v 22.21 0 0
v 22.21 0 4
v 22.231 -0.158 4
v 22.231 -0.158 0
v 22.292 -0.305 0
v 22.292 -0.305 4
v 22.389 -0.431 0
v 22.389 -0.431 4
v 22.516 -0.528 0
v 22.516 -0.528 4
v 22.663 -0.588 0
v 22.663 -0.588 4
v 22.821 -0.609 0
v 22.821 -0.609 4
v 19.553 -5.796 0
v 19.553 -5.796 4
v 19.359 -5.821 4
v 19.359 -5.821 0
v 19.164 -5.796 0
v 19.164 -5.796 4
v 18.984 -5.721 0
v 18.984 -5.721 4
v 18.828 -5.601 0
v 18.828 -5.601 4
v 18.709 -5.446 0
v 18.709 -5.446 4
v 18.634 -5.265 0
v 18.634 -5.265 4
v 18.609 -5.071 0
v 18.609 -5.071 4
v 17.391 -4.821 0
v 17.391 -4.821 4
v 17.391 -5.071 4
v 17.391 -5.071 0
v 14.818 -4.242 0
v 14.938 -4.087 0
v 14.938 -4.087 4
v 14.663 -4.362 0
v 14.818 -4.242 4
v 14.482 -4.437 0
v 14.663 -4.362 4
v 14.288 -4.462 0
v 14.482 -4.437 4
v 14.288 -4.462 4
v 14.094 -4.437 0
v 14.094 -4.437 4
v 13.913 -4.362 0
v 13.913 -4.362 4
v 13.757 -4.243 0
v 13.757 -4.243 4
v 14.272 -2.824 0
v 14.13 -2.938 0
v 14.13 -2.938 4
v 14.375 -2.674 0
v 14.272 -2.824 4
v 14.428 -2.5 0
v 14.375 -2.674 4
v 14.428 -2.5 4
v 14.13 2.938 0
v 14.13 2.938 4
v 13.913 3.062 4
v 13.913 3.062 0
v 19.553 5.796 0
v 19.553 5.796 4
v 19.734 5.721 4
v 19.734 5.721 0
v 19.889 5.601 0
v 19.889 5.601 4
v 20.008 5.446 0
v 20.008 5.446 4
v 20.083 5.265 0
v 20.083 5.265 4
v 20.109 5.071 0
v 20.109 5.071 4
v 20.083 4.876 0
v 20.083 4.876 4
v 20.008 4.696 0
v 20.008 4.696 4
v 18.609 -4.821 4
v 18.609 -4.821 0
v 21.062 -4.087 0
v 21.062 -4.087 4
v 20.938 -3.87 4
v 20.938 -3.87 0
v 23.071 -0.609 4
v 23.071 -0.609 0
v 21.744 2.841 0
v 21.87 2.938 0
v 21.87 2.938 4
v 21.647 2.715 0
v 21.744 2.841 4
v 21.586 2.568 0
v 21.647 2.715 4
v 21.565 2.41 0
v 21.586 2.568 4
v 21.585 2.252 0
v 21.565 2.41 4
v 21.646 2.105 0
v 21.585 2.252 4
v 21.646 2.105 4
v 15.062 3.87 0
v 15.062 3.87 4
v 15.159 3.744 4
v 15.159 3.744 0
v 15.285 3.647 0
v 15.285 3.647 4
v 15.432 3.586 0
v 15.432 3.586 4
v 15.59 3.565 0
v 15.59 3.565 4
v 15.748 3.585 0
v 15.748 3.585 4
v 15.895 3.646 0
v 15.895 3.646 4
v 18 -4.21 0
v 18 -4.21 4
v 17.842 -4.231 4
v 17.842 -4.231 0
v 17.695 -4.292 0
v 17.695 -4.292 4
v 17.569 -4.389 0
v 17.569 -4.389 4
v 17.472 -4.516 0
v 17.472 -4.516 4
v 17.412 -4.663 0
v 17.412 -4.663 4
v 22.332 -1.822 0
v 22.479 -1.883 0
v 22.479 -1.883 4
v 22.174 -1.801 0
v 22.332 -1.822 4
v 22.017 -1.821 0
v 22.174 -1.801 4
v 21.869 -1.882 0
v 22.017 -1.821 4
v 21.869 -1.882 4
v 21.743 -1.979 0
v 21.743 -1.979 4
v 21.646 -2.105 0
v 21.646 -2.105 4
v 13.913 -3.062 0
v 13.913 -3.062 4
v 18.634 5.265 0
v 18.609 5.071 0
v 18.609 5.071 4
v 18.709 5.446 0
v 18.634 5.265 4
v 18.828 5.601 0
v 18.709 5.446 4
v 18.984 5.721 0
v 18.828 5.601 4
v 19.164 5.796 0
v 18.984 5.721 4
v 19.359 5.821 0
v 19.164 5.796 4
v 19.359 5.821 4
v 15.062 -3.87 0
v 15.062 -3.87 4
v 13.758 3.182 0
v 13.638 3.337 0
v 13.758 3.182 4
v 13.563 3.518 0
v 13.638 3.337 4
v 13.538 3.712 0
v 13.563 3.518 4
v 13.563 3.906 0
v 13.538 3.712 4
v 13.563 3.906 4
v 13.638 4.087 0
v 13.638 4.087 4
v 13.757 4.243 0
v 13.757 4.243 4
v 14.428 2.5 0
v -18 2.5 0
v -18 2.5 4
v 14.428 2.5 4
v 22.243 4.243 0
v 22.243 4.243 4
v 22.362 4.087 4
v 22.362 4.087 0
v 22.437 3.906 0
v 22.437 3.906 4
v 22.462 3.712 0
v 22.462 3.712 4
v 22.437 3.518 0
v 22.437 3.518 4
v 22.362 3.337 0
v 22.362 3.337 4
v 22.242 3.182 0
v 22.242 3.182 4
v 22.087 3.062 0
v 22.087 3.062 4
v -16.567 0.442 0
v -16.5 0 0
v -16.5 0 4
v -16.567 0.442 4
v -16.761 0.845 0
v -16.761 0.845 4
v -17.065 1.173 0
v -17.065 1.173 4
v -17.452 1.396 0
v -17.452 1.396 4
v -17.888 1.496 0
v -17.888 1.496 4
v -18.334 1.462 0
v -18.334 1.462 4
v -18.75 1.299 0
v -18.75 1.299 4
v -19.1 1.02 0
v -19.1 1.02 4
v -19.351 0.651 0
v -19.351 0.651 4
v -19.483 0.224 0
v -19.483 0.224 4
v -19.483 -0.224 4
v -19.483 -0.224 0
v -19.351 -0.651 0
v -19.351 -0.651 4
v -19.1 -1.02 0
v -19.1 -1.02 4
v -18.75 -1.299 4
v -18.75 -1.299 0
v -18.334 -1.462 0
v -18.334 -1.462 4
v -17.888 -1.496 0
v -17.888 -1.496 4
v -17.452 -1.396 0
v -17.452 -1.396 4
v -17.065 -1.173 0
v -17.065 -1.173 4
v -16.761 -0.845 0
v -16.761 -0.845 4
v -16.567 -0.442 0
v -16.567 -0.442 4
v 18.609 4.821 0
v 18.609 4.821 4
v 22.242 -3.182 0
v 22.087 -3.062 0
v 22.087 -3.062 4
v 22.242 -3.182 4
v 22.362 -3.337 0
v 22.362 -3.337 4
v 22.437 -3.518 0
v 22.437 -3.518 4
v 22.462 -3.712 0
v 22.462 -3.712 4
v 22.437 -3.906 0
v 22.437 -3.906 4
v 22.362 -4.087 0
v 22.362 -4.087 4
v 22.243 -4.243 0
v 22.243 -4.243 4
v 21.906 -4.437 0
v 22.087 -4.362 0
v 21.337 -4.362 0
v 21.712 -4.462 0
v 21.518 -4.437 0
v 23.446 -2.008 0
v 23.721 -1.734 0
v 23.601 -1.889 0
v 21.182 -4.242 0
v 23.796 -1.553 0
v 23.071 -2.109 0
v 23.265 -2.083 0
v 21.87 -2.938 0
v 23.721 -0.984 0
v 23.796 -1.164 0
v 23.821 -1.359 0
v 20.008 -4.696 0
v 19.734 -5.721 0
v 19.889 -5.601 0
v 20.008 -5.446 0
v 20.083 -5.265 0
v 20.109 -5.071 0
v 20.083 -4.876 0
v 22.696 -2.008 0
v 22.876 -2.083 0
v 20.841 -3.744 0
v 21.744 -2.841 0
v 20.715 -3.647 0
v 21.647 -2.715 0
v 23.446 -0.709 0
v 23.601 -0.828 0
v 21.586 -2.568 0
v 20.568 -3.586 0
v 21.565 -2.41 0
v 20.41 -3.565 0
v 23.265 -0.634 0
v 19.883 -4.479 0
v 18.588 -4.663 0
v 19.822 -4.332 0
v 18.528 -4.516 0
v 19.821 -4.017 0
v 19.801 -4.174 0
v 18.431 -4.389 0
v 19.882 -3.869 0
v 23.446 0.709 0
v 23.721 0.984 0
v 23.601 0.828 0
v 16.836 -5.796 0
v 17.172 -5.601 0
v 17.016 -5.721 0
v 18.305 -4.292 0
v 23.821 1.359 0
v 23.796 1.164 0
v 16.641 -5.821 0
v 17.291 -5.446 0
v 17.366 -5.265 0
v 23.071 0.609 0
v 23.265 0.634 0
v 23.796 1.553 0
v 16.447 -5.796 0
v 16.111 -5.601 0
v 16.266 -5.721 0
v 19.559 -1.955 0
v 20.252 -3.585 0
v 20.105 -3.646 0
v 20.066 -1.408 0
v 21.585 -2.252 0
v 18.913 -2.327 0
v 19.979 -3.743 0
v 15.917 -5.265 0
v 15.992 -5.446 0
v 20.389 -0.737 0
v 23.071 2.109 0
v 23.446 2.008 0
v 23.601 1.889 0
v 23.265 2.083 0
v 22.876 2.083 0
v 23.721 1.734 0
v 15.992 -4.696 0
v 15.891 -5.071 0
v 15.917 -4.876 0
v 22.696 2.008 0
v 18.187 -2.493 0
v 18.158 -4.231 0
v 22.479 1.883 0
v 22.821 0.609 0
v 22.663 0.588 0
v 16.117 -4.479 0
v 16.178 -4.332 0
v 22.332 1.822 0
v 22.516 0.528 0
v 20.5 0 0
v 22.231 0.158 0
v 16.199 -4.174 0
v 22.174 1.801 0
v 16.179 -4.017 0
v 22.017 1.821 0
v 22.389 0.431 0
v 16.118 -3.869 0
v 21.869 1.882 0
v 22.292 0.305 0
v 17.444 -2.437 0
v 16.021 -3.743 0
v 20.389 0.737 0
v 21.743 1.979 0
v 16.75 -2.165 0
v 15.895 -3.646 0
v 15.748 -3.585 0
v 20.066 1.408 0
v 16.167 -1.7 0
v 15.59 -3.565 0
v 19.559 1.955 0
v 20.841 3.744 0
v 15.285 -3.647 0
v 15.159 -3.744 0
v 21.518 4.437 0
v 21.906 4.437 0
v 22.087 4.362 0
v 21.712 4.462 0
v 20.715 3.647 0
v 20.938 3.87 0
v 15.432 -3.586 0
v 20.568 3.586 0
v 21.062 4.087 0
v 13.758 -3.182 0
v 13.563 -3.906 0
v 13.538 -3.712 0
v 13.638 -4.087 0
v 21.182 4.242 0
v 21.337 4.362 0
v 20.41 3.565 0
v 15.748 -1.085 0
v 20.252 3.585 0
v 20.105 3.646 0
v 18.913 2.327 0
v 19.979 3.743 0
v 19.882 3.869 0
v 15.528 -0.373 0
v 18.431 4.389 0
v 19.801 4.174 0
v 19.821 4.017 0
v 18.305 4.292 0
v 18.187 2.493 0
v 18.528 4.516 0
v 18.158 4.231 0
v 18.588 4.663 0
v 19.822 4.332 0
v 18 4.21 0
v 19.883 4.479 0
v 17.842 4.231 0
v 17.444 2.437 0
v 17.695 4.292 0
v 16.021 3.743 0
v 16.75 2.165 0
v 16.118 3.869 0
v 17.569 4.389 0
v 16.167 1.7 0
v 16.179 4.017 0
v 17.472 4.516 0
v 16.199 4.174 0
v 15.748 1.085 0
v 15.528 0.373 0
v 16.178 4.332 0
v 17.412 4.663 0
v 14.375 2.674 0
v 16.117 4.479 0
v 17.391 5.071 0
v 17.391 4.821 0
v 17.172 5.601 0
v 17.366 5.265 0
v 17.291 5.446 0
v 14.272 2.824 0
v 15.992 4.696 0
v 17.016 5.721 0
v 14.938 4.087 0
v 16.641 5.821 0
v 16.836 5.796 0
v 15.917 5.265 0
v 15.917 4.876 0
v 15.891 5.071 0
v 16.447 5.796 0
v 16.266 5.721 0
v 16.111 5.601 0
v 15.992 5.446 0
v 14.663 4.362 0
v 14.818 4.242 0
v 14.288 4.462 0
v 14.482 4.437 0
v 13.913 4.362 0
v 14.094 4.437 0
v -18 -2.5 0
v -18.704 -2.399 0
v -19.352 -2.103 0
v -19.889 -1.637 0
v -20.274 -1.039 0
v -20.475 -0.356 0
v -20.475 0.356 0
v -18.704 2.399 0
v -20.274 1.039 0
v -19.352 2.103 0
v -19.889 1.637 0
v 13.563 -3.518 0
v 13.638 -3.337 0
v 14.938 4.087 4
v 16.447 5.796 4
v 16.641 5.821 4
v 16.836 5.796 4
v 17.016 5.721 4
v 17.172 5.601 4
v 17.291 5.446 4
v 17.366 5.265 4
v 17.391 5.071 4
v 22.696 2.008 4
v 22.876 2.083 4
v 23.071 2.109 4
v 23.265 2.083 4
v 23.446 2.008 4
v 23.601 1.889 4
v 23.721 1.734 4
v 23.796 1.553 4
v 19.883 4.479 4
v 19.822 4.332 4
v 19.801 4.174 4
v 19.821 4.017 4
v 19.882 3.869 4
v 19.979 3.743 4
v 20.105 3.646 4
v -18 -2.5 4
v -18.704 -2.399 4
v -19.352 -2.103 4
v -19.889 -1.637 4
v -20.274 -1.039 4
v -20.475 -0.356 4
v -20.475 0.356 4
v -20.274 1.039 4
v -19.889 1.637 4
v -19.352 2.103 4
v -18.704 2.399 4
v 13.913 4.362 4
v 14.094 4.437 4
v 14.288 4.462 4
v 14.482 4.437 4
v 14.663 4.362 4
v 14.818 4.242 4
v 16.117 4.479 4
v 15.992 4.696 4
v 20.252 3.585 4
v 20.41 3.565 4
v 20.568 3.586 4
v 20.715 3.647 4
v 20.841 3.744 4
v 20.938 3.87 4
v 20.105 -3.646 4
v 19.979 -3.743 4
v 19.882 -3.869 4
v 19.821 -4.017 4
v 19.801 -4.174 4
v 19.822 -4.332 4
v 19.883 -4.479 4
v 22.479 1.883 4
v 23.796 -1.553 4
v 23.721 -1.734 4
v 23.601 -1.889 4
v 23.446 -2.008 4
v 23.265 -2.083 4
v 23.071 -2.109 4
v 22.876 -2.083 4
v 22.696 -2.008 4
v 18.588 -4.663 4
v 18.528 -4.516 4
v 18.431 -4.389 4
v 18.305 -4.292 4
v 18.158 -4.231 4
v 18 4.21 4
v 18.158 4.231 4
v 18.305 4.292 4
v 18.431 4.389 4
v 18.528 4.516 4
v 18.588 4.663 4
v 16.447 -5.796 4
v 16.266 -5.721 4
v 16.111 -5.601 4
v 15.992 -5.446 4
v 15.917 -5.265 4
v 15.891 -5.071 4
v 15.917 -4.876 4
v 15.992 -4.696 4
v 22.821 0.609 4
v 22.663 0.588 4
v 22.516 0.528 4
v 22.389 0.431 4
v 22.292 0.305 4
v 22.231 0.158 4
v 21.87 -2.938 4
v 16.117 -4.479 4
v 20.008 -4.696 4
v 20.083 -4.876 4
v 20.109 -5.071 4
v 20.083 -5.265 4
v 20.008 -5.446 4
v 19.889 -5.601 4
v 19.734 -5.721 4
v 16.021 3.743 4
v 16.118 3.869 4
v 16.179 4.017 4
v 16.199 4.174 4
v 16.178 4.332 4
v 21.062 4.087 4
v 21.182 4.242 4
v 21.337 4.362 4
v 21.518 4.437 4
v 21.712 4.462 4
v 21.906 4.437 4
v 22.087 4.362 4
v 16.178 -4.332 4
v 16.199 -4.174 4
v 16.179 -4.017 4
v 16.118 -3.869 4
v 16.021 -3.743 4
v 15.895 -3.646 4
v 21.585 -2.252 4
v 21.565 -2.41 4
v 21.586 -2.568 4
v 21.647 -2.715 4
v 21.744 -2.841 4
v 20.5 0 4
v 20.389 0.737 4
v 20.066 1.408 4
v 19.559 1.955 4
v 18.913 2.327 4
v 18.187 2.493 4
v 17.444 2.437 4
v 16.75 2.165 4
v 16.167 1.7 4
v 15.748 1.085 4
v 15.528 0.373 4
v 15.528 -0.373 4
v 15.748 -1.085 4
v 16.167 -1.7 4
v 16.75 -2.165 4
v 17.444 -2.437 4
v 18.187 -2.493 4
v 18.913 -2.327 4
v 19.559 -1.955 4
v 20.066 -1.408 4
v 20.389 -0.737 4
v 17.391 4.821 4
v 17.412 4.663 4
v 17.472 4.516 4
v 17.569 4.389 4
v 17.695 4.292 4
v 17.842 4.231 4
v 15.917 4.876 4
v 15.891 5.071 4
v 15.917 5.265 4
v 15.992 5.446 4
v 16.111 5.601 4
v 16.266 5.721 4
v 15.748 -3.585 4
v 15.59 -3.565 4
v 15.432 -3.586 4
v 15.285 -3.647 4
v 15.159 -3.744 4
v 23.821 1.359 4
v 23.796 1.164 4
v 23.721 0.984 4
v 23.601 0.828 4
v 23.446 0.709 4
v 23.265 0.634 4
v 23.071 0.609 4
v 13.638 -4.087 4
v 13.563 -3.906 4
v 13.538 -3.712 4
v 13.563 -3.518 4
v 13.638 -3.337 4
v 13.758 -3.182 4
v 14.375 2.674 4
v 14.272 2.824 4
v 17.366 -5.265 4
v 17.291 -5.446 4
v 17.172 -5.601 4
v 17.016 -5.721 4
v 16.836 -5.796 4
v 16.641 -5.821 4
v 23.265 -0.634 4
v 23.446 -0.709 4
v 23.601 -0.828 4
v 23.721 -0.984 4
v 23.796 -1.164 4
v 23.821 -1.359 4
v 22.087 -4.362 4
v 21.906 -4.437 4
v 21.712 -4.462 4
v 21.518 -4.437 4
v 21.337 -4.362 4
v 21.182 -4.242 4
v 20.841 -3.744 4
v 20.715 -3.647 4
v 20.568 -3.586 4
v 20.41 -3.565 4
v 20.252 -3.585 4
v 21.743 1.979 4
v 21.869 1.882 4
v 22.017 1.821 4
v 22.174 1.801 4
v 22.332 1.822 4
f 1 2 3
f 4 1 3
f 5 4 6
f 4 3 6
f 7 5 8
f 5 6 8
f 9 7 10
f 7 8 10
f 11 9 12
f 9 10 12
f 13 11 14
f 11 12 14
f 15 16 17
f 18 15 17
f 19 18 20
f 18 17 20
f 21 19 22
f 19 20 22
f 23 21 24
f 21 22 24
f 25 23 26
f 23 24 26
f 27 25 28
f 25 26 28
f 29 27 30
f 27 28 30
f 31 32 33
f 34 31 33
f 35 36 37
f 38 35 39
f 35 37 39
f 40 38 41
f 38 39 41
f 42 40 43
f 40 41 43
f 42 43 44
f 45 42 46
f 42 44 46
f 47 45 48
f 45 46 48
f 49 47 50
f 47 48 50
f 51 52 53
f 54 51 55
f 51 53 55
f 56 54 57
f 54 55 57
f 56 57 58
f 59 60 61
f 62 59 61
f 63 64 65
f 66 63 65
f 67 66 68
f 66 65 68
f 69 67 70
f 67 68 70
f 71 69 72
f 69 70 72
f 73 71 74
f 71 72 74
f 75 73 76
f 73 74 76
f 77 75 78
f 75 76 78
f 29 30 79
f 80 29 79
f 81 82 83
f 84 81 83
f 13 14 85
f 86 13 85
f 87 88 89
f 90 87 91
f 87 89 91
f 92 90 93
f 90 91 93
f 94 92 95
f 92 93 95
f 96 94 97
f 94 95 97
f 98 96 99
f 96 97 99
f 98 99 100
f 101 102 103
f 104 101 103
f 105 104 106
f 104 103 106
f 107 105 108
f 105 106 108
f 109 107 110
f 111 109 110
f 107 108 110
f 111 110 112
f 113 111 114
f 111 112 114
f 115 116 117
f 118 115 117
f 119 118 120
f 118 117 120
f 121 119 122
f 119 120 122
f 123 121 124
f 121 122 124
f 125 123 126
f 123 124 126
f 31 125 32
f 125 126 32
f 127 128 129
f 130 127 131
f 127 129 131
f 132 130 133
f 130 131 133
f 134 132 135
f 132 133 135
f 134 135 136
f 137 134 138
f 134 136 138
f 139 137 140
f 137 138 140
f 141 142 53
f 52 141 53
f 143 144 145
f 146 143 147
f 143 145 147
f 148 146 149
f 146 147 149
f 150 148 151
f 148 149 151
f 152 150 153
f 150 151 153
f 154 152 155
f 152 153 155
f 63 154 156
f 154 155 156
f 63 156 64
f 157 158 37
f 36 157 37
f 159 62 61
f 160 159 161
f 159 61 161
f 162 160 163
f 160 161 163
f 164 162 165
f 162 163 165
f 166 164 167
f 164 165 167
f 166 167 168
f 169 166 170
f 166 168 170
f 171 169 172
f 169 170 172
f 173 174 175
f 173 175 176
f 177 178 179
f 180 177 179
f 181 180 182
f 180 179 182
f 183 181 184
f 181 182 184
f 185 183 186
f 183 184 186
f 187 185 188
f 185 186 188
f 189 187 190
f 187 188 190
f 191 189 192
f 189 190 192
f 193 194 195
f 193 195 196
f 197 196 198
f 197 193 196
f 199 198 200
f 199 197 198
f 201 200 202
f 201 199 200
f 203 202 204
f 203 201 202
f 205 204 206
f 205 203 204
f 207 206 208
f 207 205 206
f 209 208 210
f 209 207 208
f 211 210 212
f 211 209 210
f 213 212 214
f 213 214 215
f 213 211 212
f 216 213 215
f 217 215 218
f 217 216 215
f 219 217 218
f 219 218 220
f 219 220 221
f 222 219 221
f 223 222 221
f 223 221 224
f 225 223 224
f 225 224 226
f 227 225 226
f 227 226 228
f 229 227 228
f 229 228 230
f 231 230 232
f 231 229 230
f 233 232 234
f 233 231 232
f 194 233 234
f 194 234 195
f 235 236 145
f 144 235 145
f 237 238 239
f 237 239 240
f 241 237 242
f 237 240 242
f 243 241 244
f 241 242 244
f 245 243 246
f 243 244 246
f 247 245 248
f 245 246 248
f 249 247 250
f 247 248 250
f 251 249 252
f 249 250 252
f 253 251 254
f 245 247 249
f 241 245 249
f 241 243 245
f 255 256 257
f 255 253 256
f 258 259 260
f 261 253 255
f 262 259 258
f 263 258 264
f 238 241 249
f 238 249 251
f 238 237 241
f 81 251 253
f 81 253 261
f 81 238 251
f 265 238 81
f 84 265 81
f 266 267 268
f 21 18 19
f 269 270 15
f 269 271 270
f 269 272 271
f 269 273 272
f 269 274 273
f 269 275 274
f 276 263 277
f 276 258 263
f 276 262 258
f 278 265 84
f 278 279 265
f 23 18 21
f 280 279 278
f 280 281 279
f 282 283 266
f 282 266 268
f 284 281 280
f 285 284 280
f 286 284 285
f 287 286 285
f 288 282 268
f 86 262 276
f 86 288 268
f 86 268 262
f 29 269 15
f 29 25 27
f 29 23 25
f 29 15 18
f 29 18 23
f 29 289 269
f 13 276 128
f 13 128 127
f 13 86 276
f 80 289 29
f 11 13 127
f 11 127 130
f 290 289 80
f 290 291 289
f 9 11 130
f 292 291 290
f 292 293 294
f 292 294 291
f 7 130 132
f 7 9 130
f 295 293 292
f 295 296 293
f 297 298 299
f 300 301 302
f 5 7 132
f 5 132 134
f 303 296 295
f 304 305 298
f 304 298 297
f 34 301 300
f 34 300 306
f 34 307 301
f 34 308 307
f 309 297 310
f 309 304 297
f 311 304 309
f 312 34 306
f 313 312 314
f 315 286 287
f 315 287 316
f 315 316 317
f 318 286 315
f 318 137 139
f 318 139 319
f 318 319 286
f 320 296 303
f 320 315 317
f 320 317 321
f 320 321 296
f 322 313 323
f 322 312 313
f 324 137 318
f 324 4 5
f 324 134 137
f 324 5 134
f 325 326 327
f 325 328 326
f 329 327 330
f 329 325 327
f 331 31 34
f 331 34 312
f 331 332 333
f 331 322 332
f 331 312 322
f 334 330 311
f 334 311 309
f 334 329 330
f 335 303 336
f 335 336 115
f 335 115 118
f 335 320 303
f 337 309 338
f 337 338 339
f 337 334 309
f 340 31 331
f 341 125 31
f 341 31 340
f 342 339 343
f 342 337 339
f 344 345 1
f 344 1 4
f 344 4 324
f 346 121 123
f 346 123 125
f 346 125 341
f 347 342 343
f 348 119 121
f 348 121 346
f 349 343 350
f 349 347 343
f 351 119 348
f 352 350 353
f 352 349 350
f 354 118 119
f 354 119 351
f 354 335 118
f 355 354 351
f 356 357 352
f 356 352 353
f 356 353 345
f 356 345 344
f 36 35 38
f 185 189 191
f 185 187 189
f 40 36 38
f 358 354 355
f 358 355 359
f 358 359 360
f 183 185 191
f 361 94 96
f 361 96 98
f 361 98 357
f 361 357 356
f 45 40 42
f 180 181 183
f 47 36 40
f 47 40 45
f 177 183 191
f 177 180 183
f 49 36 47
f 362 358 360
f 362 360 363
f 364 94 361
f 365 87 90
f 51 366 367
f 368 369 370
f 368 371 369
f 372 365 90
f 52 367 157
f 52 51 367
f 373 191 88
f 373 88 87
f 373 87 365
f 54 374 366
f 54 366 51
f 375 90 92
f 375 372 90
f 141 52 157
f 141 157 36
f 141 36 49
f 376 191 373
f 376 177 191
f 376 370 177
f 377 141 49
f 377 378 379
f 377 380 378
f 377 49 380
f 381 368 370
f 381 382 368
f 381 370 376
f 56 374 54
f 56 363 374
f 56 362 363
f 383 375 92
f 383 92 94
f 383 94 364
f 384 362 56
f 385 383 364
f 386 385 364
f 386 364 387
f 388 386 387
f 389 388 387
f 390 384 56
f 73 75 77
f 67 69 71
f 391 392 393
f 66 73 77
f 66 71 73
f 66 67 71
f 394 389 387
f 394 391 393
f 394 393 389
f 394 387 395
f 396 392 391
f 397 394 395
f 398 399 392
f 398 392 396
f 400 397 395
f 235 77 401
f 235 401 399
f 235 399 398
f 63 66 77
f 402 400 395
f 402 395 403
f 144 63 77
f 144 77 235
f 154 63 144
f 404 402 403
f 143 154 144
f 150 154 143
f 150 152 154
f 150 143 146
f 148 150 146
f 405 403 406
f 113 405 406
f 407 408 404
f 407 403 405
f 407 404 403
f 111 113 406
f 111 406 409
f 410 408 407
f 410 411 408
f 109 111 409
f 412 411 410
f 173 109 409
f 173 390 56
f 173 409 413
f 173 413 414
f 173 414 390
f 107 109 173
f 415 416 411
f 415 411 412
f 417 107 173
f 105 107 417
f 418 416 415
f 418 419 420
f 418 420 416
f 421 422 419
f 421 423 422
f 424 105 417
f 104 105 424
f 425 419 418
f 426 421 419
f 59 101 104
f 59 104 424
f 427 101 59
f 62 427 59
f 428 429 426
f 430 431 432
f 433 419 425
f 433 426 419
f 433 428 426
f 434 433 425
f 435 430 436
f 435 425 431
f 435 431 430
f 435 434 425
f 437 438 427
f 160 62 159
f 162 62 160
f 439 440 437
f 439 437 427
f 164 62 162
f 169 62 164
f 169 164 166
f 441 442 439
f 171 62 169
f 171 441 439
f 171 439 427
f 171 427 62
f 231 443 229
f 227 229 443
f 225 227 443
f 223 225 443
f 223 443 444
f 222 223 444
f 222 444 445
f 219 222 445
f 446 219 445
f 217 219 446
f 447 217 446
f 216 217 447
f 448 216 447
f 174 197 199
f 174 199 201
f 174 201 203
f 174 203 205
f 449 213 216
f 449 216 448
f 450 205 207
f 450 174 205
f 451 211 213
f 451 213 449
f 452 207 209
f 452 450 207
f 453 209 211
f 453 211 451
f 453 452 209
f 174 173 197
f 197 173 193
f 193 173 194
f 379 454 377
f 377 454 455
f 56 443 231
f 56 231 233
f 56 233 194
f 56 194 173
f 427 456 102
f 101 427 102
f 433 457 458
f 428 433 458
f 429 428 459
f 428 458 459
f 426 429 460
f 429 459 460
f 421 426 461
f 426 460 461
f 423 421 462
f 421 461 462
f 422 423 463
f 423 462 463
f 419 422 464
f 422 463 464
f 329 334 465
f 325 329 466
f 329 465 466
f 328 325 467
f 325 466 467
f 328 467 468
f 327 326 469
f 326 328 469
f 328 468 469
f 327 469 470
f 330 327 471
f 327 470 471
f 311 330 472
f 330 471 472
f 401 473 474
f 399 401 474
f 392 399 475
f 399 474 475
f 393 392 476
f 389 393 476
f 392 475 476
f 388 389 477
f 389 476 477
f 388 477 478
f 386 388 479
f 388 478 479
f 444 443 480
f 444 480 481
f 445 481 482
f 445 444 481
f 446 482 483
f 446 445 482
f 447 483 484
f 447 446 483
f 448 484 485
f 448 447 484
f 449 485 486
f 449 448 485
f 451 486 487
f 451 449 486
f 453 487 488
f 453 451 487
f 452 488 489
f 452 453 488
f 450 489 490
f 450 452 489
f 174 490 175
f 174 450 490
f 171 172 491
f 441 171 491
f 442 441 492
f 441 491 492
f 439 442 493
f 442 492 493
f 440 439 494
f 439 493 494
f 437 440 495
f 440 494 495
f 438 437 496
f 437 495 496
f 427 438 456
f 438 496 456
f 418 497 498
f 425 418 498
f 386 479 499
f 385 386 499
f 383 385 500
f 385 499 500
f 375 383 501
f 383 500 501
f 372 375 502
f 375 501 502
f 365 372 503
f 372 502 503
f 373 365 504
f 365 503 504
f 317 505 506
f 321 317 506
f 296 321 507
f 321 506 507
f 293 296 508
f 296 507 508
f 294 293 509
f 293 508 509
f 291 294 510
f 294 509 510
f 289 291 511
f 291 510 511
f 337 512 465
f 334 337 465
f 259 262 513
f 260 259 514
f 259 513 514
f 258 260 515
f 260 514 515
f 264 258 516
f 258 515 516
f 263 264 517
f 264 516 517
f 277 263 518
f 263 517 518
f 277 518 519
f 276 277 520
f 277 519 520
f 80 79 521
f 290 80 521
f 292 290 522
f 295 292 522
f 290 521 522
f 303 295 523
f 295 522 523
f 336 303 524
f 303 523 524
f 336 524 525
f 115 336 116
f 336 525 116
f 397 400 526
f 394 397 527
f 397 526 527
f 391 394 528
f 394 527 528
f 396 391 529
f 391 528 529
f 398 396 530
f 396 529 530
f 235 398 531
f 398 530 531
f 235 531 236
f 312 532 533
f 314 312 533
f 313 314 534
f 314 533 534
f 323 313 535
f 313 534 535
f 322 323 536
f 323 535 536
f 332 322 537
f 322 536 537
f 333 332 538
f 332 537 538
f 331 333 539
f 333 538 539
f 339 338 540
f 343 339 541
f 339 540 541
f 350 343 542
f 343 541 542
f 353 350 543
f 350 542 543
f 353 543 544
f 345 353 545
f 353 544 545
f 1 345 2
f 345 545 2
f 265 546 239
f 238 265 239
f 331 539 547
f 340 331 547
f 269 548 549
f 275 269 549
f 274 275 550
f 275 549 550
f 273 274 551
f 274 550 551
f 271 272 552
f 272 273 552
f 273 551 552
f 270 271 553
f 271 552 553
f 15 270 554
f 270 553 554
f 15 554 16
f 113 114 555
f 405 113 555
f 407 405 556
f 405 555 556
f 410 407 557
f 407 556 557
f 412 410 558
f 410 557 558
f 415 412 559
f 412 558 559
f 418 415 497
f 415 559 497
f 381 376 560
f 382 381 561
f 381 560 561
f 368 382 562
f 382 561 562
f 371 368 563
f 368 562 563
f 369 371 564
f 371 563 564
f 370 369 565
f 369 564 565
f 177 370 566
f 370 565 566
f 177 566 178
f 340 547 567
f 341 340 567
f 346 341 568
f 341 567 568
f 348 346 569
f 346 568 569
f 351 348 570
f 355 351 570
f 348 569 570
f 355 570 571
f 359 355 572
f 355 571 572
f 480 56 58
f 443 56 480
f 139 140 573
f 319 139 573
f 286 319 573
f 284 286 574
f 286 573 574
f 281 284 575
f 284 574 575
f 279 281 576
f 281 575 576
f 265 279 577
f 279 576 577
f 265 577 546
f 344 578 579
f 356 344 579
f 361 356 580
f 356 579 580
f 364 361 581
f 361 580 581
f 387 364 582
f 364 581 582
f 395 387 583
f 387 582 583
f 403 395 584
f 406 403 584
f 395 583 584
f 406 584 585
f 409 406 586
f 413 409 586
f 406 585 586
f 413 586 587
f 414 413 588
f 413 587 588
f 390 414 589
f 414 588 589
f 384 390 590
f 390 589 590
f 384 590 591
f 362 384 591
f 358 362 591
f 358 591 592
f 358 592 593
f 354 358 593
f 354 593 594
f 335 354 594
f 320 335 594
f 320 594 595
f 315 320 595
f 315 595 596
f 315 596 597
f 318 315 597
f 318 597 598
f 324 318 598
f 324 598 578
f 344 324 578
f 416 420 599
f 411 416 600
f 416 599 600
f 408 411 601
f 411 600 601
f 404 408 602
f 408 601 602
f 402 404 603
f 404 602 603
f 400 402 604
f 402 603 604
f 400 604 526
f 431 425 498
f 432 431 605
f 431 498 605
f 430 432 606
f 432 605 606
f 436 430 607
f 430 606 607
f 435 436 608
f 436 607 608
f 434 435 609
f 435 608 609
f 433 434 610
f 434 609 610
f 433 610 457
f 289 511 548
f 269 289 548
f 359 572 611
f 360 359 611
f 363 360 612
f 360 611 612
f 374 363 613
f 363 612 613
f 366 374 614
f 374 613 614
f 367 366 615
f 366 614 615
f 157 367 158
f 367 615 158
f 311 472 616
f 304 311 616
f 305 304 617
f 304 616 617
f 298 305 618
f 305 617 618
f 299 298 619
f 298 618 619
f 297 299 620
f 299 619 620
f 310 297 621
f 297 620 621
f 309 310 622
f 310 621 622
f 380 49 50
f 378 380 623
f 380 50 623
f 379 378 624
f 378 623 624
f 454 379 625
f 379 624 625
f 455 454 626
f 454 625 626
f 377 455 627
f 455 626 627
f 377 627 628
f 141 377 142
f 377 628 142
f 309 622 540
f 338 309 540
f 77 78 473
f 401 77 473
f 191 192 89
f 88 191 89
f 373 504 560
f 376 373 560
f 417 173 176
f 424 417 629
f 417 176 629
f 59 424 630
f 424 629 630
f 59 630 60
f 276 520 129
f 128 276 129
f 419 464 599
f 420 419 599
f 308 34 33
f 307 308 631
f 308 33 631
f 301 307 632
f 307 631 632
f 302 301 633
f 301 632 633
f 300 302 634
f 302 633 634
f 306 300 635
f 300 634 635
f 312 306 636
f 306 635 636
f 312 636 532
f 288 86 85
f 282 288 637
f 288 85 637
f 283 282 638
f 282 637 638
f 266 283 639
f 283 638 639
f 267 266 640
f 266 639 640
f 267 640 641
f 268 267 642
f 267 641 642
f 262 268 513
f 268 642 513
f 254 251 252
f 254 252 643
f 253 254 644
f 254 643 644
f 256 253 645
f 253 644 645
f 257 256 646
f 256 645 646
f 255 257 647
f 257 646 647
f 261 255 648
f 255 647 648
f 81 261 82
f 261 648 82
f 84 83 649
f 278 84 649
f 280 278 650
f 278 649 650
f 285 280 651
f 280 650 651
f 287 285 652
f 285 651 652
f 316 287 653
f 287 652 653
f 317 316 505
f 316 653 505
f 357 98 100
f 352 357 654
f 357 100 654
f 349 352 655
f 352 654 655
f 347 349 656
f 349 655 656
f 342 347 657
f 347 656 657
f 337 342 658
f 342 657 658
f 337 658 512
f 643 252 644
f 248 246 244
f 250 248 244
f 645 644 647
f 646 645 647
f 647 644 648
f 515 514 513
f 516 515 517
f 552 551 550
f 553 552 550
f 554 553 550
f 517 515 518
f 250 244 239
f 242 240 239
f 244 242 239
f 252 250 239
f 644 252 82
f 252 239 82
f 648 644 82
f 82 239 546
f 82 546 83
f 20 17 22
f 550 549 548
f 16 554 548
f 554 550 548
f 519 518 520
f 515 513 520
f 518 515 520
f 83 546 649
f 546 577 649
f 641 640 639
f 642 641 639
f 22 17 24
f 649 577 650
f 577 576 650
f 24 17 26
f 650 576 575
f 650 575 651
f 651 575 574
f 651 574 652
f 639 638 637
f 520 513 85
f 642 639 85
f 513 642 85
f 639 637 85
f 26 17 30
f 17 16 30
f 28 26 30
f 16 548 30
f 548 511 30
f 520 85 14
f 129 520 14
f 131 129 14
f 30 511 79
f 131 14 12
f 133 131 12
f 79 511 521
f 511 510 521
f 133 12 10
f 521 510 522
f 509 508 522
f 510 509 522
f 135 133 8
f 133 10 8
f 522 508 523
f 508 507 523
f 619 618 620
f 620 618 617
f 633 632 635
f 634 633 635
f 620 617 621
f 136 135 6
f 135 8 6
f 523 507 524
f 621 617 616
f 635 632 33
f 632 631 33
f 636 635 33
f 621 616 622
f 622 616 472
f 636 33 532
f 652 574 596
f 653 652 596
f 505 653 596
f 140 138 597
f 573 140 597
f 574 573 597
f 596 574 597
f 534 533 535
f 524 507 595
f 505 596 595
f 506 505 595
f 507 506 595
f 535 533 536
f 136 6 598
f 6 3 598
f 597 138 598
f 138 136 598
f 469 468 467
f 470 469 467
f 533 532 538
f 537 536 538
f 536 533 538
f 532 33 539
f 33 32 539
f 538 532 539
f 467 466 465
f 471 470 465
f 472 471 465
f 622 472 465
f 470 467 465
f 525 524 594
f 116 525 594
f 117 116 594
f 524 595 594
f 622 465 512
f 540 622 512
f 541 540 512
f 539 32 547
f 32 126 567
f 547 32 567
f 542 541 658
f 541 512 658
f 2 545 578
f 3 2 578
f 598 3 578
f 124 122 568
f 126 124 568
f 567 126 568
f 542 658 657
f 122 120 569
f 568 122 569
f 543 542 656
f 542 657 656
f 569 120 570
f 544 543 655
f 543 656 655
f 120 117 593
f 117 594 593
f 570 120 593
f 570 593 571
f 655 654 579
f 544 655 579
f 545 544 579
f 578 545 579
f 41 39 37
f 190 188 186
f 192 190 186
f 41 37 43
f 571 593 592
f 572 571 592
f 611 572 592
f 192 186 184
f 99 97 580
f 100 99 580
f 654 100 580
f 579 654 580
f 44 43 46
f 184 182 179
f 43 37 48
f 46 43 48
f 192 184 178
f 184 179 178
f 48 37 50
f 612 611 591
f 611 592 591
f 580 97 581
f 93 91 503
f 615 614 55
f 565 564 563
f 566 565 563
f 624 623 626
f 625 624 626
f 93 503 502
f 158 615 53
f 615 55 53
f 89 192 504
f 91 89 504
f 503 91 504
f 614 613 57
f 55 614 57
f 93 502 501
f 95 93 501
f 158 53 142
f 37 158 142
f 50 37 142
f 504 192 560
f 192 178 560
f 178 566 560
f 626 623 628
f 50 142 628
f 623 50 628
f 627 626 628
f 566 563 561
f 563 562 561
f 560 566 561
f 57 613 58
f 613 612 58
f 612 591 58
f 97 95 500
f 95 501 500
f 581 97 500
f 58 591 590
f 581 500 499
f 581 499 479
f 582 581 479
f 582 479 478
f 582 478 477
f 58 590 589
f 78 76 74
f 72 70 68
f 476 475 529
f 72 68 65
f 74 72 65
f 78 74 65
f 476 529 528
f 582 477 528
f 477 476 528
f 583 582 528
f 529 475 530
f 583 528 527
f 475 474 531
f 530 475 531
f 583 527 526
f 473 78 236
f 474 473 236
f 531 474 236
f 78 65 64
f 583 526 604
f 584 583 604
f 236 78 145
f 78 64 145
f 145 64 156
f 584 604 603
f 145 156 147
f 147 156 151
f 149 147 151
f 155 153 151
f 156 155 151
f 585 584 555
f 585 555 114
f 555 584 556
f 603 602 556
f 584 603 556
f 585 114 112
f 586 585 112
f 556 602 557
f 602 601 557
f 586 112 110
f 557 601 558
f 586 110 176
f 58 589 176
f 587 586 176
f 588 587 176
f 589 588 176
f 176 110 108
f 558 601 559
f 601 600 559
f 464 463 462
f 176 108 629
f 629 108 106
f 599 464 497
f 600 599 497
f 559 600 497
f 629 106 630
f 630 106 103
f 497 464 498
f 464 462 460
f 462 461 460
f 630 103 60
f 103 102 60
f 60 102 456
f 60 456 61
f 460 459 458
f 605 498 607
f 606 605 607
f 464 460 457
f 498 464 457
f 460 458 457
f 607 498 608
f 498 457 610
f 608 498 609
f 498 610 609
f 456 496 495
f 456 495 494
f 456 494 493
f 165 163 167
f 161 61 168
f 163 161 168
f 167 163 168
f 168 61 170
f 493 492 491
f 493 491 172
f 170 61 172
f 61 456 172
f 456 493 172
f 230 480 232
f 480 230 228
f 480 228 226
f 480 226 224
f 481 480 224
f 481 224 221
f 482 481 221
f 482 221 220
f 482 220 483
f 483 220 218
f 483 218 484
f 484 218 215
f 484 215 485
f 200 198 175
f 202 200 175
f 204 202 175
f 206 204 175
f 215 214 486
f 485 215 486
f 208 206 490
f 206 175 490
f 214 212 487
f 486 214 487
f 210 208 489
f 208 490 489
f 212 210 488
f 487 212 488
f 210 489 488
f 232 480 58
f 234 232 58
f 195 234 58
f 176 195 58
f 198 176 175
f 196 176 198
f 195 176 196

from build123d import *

# Parameters (mm, degrees)
SKETCH1_R           = 1.5
BOSS_EXTRUDE1_DEPTH = 4
CUT_EXTRUDE2_DEPTH  = 5
CIRPATTERN1_COUNT   = 12
SKETCH3_W           = 7.863082298
SKETCH3_H           = 5
BOSS_EXTRUDE2_DEPTH = 4
SKETCH4_R           = 2.5
CUT_EXTRUDE3_DEPTH  = 5


with BuildPart() as part:
    # Sketch1 → Boss-Extrude1 (new body)
    with BuildSketch(Plane.XY):
        with BuildLine():
            Line((-18, 2.5), (12.545643943, 2.5))
            ThreePointArc((12.545643943, 2.5), (24, 0), (12.545643943, -2.5))
            Line((12.545643943, -2.5), (-18, -2.5))
            ThreePointArc((-18, -2.5), (-20.5, 0), (-18, 2.5))
        make_face()
        with Locations((-18, 0)):
            Circle(SKETCH1_R, mode=Mode.SUBTRACT)
    extrude(amount=BOSS_EXTRUDE1_DEPTH)

    # Sketch2 → Cut-Extrude2 (cut, through all)
    with BuildSketch(Plane.XY.offset(4)):
        with BuildLine():
            Line((20.008070513, 4.695554958), (19.882890915, 4.479152397))
            ThreePointArc((19.882890915, 4.479152397), (19.821496871, 4.016588638), (20.105, 3.64596695))
            ThreePointArc((20.105, 3.64596695), (20.567719361, 3.585756883), (20.937614306, 3.870207564))
            Line((20.937614306, 3.870207564), (21.062434622, 4.086817556))
            ThreePointArc((21.062434622, 4.086817556), (21.614093727, 4.455903836), (22.242640687, 4.242640687))
            ThreePointArc((22.242640687, 4.242640687), (21.17938524, 5.506856773), (19.552914271, 5.795554958))
            ThreePointArc((19.552914271, 5.795554958), (20.051879055, 5.357848898), (20.008070513, 4.695554958))
        make_face()
    cut_extrude2 = extrude(amount=-CUT_EXTRUDE2_DEPTH, mode=Mode.SUBTRACT)

    # CirPattern1: Cut-Extrude2 ×12 about axis
    cirpattern1_axis = Axis((18, 0, 0), (0, 0, 1))
    for i in range(1, CIRPATTERN1_COUNT):
        add(cut_extrude2.rotate(cirpattern1_axis, i * 360 / CIRPATTERN1_COUNT), mode=Mode.SUBTRACT)

    # Sketch3 → Boss-Extrude2 (add)
    with BuildSketch(Plane.XY.offset(4)):
        with Locations((12.029323846, 0)):
            Rectangle(SKETCH3_W, SKETCH3_H)
    extrude(amount=-BOSS_EXTRUDE2_DEPTH)

    # Sketch4 → Cut-Extrude3 (cut, through all)
    with BuildSketch(Plane.XY.offset(4)):
        with Locations((18, 0)):
            Circle(SKETCH4_R)
    extrude(amount=-CUT_EXTRUDE3_DEPTH, mode=Mode.SUBTRACT)


solid = part.part
